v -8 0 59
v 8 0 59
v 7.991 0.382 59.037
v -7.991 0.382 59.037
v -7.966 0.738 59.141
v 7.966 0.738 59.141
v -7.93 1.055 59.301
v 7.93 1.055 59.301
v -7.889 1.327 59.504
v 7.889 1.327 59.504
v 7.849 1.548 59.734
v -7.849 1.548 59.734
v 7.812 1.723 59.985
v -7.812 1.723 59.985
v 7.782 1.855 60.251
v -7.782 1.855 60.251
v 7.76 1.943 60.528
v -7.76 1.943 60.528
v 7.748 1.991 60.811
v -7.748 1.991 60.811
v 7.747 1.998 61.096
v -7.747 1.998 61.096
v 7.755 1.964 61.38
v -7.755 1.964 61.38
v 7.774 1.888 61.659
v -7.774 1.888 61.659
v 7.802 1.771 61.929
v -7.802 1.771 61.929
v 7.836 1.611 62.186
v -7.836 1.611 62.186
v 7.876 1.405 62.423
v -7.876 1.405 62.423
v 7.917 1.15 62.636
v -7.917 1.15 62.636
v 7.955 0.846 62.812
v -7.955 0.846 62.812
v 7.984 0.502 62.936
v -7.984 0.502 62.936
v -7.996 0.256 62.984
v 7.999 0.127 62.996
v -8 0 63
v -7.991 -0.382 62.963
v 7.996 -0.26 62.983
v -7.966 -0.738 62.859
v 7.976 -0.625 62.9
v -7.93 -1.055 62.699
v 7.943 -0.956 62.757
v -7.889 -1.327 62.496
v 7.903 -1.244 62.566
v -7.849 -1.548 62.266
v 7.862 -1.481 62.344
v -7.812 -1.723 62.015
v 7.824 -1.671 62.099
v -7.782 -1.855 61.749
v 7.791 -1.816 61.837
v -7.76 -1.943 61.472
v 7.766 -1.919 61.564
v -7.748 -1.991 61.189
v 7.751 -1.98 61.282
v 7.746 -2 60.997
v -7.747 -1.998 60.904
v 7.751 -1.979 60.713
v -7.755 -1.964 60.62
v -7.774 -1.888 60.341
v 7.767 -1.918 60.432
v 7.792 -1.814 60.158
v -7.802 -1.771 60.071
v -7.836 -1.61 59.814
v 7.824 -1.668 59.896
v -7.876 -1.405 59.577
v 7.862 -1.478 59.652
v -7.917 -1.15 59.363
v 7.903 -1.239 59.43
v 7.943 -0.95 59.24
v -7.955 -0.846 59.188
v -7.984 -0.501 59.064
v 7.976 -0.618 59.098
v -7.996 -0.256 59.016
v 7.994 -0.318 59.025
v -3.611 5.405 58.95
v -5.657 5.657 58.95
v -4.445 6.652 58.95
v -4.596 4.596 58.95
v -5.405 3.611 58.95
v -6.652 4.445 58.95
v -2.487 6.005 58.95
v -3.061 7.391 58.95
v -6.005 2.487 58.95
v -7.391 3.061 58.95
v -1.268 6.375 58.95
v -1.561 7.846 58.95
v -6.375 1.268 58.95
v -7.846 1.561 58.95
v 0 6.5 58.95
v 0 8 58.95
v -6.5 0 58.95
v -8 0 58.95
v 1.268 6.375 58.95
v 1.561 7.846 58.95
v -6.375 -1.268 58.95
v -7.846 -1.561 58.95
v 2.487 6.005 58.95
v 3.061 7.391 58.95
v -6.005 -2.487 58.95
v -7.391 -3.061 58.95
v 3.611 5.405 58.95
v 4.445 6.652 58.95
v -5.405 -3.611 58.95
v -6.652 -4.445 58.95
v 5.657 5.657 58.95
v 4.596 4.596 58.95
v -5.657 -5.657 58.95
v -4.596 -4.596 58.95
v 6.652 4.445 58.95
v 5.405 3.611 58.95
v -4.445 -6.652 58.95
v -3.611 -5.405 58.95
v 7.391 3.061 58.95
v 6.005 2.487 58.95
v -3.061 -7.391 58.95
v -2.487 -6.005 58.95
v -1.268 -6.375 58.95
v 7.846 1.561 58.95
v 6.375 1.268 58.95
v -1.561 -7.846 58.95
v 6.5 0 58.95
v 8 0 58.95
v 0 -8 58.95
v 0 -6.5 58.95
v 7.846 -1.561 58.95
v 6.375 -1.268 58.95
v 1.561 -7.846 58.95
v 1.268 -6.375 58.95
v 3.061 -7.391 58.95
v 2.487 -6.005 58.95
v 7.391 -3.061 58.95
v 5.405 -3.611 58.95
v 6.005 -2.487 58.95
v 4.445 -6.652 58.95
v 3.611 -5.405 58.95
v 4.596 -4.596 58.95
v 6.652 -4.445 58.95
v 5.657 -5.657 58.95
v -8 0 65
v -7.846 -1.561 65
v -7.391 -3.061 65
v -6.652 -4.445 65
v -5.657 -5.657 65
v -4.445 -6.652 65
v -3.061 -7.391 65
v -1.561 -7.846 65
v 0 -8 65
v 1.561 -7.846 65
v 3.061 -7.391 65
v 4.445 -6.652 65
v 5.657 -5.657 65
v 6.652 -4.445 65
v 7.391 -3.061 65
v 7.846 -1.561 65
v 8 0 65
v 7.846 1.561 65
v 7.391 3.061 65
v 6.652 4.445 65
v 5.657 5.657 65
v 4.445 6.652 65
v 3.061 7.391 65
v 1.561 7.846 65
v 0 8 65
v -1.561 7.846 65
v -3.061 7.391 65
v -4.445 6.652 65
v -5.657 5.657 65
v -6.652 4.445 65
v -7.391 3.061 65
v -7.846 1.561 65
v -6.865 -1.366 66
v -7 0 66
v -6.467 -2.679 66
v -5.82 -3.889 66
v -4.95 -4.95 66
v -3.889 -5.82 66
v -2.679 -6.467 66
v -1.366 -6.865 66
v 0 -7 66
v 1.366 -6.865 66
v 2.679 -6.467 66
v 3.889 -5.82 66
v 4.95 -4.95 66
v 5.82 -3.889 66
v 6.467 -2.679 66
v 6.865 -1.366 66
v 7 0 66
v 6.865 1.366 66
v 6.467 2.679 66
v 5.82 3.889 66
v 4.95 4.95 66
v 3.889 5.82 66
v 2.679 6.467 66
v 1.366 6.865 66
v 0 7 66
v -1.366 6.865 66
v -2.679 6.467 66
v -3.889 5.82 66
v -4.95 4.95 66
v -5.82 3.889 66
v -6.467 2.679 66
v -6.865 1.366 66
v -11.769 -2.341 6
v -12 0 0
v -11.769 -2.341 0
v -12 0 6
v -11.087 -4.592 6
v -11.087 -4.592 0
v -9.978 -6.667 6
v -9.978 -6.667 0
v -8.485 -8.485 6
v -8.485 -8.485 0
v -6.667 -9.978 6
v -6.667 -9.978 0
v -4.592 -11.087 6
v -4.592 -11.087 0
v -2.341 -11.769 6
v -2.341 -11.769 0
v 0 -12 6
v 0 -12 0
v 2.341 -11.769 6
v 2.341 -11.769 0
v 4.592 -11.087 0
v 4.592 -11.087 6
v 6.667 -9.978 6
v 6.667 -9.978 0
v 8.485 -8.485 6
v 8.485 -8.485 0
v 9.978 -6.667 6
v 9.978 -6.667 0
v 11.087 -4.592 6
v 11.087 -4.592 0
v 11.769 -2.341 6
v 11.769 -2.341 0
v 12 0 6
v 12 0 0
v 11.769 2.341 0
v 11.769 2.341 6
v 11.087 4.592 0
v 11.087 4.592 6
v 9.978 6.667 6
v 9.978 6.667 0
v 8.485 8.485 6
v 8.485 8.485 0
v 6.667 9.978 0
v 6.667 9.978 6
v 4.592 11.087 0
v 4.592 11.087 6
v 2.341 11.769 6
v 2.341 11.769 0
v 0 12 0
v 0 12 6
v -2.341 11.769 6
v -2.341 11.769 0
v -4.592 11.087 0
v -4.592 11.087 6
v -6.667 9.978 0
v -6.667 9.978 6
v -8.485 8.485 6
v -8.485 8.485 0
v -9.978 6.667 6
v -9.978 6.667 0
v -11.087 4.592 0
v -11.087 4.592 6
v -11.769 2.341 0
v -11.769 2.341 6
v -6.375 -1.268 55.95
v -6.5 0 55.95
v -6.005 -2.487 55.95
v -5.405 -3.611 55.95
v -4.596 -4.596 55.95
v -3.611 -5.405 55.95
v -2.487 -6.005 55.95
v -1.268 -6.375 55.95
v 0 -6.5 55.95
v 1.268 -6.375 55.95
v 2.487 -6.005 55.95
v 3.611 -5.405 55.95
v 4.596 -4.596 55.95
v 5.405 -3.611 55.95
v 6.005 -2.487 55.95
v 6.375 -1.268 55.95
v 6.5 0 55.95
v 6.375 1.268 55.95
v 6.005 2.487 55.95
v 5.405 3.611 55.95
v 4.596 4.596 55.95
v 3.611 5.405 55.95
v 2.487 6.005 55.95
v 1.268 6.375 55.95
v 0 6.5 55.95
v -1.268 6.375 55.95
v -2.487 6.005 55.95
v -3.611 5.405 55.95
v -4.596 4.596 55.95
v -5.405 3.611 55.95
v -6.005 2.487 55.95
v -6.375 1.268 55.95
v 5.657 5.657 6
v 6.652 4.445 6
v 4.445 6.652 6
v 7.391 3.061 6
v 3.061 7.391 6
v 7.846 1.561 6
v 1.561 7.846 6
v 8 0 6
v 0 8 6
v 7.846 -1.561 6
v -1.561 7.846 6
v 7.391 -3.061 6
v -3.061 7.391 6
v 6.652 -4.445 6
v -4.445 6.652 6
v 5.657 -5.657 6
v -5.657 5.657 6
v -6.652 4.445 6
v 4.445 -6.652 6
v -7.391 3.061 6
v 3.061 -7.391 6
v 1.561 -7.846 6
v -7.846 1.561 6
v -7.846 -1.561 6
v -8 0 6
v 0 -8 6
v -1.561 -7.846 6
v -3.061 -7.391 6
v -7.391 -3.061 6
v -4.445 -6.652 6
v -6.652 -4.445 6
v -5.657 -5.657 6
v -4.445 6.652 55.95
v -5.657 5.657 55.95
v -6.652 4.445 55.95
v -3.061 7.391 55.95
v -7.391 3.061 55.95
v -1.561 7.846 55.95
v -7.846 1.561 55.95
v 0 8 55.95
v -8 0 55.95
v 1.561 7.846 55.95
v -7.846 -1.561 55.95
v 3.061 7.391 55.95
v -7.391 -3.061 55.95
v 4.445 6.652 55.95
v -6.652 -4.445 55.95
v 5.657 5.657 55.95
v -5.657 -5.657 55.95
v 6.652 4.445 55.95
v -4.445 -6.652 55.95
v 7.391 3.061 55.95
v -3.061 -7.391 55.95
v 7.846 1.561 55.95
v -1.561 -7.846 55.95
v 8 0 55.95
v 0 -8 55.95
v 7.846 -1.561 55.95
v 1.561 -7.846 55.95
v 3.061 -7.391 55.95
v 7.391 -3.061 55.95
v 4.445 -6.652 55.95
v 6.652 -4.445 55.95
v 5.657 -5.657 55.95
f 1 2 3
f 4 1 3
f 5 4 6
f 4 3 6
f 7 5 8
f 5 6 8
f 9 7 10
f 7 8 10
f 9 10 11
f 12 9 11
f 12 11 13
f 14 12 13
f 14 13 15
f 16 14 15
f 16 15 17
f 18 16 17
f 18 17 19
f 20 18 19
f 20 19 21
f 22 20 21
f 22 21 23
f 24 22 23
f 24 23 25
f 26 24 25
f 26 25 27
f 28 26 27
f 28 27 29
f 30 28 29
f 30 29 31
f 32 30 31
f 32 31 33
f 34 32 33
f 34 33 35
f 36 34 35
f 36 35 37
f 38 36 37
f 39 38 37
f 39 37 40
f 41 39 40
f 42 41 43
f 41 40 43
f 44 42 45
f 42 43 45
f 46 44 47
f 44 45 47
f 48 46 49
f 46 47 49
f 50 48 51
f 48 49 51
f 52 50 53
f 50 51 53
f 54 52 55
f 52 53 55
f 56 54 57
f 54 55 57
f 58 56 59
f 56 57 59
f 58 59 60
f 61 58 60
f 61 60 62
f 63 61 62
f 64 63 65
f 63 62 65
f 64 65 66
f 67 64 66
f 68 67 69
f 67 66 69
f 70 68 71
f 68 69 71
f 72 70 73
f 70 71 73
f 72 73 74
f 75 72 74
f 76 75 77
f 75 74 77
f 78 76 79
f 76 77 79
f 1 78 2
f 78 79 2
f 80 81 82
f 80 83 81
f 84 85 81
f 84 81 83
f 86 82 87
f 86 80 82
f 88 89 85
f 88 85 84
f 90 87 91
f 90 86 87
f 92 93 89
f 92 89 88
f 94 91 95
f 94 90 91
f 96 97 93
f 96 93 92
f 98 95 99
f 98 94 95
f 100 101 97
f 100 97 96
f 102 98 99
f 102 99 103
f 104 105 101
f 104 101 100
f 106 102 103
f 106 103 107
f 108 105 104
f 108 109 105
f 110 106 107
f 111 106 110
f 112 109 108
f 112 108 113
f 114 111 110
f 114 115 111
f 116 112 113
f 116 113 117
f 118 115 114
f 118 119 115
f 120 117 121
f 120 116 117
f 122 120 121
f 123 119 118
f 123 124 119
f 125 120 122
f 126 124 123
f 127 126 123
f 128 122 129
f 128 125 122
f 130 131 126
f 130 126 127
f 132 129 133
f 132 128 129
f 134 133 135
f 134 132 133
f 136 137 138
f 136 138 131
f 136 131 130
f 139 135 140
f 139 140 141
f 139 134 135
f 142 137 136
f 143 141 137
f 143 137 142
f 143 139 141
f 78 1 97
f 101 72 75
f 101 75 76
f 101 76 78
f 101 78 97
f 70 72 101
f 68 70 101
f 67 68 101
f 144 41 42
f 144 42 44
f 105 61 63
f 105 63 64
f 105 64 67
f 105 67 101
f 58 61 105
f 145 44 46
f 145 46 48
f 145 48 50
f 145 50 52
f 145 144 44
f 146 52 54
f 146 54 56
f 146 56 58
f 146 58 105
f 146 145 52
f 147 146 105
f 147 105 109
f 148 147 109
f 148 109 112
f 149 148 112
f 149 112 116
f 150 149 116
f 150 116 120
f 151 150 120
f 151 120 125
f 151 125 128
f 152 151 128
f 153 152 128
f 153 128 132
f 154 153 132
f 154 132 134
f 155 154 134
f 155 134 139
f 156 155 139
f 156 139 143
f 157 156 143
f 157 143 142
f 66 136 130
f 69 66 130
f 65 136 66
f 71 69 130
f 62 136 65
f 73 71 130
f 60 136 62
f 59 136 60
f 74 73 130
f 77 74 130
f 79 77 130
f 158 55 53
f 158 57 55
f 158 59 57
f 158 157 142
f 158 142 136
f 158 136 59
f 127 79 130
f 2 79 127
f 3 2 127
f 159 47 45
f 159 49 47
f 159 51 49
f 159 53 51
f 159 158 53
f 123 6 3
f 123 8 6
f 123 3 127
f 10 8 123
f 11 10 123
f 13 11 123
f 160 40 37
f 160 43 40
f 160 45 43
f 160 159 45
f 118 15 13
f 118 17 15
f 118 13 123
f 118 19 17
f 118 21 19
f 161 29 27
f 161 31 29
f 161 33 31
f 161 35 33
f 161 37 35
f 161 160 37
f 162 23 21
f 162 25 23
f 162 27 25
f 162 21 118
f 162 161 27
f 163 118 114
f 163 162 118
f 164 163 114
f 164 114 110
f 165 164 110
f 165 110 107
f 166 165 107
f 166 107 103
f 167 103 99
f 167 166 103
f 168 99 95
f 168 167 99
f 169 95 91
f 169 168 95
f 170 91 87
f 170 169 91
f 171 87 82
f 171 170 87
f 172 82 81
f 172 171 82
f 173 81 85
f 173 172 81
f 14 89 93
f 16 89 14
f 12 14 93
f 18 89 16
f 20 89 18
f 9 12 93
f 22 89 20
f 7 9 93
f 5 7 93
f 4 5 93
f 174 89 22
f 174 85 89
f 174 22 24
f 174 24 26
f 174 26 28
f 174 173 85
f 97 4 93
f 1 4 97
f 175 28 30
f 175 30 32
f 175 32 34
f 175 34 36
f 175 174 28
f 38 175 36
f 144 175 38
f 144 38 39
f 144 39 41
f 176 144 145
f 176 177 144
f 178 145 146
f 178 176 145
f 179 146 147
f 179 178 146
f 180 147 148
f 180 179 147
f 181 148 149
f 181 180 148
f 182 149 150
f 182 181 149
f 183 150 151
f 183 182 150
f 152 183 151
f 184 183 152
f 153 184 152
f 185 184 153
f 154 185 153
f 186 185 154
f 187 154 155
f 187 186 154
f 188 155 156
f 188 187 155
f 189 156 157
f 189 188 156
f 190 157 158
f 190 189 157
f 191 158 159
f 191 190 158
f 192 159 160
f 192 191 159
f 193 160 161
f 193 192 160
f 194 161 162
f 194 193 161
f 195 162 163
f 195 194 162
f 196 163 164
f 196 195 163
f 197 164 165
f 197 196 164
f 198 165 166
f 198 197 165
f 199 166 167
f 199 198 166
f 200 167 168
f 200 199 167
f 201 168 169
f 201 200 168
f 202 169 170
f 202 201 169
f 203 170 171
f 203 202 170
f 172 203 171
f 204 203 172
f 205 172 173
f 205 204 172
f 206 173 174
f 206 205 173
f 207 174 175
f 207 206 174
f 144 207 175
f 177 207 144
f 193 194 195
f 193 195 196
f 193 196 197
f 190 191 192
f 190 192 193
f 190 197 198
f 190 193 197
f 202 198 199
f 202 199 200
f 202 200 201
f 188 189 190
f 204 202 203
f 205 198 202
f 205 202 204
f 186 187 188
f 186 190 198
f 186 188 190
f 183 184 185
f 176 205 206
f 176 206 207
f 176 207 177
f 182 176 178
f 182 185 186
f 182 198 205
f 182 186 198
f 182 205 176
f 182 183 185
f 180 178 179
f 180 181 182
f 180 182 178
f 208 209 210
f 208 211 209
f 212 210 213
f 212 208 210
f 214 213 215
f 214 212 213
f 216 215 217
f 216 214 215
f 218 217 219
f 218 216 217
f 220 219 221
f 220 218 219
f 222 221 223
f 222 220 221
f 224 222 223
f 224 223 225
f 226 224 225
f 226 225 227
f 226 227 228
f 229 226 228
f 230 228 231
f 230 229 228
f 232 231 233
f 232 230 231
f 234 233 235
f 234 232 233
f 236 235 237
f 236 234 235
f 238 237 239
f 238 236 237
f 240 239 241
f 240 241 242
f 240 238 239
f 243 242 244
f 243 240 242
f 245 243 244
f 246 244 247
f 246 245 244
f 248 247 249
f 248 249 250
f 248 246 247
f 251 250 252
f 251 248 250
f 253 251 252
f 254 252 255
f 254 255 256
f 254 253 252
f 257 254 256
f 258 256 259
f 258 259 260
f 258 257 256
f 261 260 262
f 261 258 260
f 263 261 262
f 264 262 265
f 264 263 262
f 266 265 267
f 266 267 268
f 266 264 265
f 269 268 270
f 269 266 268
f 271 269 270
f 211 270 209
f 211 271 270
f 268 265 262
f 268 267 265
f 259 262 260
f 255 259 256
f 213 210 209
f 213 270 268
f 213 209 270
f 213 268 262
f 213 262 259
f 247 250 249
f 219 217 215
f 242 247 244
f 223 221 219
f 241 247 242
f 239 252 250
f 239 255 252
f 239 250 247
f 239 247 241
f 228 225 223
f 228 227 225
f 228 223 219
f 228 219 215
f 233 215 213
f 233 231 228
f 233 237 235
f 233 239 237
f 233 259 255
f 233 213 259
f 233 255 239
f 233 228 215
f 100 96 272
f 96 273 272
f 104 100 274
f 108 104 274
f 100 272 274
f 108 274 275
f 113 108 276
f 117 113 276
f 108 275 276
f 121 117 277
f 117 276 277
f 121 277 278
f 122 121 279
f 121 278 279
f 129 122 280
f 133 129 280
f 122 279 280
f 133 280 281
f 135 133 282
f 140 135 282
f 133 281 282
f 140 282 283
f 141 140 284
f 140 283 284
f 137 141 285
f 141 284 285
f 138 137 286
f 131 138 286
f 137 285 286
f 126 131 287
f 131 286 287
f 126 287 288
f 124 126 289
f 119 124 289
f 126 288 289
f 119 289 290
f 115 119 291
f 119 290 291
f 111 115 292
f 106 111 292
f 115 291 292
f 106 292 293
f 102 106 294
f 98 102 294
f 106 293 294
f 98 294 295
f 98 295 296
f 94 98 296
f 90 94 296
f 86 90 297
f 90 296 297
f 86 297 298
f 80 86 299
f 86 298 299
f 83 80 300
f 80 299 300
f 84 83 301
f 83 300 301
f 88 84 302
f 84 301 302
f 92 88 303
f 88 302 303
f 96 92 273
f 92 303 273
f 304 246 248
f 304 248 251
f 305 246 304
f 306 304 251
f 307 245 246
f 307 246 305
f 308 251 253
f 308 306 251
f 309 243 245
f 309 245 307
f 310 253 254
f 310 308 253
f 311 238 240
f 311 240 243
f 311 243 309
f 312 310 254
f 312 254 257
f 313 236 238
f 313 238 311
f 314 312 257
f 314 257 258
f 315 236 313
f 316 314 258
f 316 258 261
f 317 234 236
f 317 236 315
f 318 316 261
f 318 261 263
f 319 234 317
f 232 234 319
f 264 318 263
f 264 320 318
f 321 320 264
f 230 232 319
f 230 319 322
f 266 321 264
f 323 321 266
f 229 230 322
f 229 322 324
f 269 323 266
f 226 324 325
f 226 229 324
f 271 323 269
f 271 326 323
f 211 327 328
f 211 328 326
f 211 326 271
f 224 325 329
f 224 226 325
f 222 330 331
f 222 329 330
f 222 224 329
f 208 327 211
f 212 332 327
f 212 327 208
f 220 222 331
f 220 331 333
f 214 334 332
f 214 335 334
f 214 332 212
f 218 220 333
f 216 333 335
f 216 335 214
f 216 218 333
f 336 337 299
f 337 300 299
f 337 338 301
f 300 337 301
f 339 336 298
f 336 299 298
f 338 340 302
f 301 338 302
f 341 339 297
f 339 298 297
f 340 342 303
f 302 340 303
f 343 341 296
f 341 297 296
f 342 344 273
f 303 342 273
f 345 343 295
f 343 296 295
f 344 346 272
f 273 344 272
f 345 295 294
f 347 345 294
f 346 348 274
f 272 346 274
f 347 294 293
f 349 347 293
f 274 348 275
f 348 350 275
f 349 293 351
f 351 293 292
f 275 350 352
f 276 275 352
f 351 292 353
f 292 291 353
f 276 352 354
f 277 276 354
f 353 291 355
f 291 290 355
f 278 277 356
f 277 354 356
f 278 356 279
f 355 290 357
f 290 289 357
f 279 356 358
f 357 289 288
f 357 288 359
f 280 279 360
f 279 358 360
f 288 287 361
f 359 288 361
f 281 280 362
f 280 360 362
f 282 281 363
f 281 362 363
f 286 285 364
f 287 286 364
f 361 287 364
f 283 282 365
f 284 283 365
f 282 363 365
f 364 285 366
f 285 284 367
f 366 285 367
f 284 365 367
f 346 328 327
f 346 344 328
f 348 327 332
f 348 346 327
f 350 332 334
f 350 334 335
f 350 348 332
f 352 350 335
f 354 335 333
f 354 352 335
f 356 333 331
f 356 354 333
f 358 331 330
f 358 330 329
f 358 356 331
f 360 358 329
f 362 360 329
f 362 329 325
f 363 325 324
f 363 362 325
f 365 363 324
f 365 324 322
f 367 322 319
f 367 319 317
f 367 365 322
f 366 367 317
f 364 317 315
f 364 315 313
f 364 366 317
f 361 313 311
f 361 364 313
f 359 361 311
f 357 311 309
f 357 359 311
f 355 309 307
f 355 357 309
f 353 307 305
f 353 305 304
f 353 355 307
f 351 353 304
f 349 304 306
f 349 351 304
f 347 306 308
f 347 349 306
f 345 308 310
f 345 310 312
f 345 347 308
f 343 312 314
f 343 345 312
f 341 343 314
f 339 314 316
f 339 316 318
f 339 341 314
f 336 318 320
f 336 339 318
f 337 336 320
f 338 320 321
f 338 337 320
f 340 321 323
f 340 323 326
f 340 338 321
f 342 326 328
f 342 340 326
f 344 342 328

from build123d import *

# Parameters (mm, degrees)
SKETCH_9_R           = 2
CUT_EXTRUDE_12_DEPTH = 20
SKETCH_13_W          = 2
SKETCH_13_H          = 3


with BuildPart() as part:
    # 草图8 → 旋转2 (revolve)
    with BuildSketch(Plane(origin=(0, 0, 0), x_dir=(1, 0, 0), z_dir=(0, 1, 0)), mode=Mode.PRIVATE) as revolve_2_sk:
        Polygon((0, 0), (12, 0), (12, -6), (8, -6), (8, -65), (7, -66), (0, -66), align=None)
    revolve(revolve_2_sk.sketch.rotate(Axis((0, 0, 0), (0, 0, 1)), 180), axis=Axis((0, 0, 0), (0, 0, 1)))

    # 草图9 → 切除-拉伸12 (cut)
    with BuildSketch(Plane(origin=(9, 0, 0), x_dir=(0, 0, -1), z_dir=(1, 0, 0))):
        with Locations((-61, 0)):
            Circle(SKETCH_9_R)
    extrude(amount=-CUT_EXTRUDE_12_DEPTH, mode=Mode.SUBTRACT)

    # 草图13 → 切除-旋转3 (revolve, cut)
    with BuildSketch(Plane(origin=(0, 0, 0), x_dir=(1, 0, 0), z_dir=(0, 1, 0)), mode=Mode.PRIVATE) as cut_revolve_3_sk:
        with Locations((7.5, -57.45)):
            Rectangle(SKETCH_13_W, SKETCH_13_H)
    revolve(cut_revolve_3_sk.sketch.rotate(Axis((0, 0, 0), (0, 0, 1)), 180), axis=Axis((0, 0, 0), (0, 0, 1)), mode=Mode.SUBTRACT)


solid = part.part
